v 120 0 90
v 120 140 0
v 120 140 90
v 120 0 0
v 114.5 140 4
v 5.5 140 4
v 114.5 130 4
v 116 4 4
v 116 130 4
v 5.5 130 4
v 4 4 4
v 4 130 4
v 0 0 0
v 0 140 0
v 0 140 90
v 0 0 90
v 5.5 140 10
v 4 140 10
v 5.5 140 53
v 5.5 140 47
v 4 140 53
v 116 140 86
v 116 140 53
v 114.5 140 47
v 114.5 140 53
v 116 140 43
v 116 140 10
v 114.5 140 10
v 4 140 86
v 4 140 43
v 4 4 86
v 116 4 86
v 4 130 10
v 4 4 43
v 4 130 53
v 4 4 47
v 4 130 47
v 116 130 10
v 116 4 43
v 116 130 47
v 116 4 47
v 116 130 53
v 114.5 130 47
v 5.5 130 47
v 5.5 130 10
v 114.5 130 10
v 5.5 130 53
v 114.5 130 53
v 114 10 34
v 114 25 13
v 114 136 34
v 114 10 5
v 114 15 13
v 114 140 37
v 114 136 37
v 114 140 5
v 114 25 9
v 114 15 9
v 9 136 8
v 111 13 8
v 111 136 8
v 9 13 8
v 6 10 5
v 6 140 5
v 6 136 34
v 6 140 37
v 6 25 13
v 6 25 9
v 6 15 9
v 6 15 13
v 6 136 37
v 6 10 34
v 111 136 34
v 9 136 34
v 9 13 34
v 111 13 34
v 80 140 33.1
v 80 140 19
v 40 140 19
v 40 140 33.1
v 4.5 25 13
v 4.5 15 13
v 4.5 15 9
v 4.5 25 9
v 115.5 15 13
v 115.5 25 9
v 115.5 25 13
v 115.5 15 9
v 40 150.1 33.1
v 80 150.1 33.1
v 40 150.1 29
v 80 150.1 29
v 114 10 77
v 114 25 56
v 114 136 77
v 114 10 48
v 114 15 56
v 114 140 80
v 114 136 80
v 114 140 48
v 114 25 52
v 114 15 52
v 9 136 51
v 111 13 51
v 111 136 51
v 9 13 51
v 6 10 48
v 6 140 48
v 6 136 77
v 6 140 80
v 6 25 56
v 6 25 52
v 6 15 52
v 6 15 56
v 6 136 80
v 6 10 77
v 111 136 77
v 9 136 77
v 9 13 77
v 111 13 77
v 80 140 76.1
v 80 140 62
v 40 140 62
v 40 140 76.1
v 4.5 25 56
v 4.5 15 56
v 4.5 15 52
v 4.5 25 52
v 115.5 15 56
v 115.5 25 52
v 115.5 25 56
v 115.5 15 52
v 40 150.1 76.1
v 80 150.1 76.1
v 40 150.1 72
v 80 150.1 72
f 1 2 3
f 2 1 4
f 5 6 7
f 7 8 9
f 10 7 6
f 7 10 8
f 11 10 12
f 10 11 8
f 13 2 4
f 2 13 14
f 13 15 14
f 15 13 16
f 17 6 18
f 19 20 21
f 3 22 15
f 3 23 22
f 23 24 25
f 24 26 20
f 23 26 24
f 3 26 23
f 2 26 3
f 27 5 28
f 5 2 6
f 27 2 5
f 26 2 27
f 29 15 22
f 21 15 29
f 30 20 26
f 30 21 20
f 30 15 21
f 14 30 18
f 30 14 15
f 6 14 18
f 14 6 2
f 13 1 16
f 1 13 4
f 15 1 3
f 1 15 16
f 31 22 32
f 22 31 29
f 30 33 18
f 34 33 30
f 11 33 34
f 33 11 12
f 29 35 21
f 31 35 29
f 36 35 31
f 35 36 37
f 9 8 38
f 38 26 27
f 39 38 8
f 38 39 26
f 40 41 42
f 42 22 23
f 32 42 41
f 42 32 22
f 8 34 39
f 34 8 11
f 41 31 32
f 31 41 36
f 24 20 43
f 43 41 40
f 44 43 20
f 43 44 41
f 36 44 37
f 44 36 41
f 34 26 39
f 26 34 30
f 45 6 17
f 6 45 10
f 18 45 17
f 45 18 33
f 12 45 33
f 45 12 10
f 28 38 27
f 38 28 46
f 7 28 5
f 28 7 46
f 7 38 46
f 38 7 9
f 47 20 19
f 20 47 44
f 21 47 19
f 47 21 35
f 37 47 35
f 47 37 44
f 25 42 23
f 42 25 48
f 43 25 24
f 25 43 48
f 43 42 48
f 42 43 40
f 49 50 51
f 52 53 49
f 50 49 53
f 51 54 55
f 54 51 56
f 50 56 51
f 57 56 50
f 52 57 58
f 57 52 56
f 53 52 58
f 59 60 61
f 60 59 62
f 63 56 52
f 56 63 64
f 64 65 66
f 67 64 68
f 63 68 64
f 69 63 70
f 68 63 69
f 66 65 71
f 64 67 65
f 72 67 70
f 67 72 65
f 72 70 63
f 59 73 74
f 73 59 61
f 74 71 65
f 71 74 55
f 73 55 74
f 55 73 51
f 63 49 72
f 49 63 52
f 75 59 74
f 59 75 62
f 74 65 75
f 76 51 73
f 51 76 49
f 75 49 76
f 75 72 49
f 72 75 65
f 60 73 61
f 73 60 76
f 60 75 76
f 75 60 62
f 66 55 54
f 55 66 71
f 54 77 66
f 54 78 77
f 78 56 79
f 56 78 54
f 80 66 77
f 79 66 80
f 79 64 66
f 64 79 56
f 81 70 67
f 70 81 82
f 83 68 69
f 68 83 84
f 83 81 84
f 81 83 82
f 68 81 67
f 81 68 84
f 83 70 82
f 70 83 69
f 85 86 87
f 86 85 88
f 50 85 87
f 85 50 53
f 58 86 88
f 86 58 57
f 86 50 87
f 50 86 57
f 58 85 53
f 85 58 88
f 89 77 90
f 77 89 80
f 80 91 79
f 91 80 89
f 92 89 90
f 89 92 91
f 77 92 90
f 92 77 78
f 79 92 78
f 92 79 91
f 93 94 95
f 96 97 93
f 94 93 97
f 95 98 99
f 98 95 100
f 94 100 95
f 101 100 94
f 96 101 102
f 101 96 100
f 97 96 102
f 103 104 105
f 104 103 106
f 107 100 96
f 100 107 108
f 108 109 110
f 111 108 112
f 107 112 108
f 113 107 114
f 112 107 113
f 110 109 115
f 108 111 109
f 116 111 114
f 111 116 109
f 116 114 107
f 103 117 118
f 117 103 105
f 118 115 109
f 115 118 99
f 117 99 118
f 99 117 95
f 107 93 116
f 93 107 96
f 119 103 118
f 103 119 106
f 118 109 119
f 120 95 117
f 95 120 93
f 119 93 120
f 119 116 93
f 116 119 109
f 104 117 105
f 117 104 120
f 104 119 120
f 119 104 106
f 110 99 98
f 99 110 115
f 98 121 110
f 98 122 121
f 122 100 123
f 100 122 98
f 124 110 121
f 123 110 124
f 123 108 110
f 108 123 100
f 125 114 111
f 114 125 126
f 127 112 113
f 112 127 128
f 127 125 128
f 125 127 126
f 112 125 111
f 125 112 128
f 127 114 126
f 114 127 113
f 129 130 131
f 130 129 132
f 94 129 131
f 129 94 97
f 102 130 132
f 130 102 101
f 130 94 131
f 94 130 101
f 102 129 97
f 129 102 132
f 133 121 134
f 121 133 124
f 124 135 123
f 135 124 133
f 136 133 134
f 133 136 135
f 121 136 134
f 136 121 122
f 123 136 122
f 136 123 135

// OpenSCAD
cadverify_only = "";
module instance(name, part, unit = 1) {
    echo(cadverify_instance = [name, part, unit]);
    if (cadverify_only == "" || cadverify_only == name) children();
}

part = "assembly"; // [assembly, frame, drawer]

// ---------- parameters (mm) ----------
W = 120; Df = 140; H = 90; t = 4;
DW = 108; DDbox = 126; frontT = 4; pullP = 10; DH = 32;

// frame assembly geometry (assembly coords: x 0..120, y 0..140 back->front, z 0..90)
module frame_asm() {
    union() {
        // bottom
        cube([120, 140, 4]);
        // top
        translate([0, 0, 86]) cube([120, 140, 4]);
        // left wall
        cube([4, 140, 90]);
        // right wall
        translate([116, 0, 0]) cube([4, 140, 90]);
        // back wall
        cube([120, 4, 90]);
        // middle shelf (between side walls, from back to front)
        translate([4, 0, 43]) cube([112, 140, 4]);
        // stop blocks: overlap into walls/floors by 0.1 for manifold union
        // lower left
        translate([3.9, 130, 3.9]) cube([1.6, 10, 6.1]);
        // lower right
        translate([114.5, 130, 3.9]) cube([1.6, 10, 6.1]);
        // upper left (on middle shelf)
        translate([3.9, 130, 46.9]) cube([1.6, 10, 6.1]);
        // upper right
        translate([114.5, 130, 46.9]) cube([1.6, 10, 6.1]);
    }
}

// drawer local geometry (local coords: box min at 0,0,0; x 0..108, y 0..130 box+front, pull to 140, z 0..32, tabs to x -1.5..109.5)
module drawer_local() {
    union() {
        // bottom
        cube([108, 126, 3]);
        // left wall
        translate([0, 0, 3]) cube([3, 126, 26]);
        // right wall
        translate([105, 0, 3]) cube([3, 126, 26]);
        // back wall
        translate([0, 0, 3]) cube([108, 3, 26]);
        // front panel (full height)
        translate([0, 126, 0]) cube([108, 4, 32]);
        // stop tabs (overlap 0.5 into side walls)
        translate([-1.5, 5, 4]) cube([2.0, 10, 4]);
        translate([107.5, 5, 4]) cube([2.0, 10, 4]);
        // pull wedge: convex hull of 4 bars along X at YZ corners
        hull() {
            translate([34, 129.9, 14]) cube([40, 0.1, 0.1]);
            translate([34, 129.9, 28]) cube([40, 0.1, 0.1]);
            translate([34, 140, 24]) cube([40, 0.1, 0.1]);
            translate([34, 140, 28]) cube([40, 0.1, 0.1]);
        }
    }
}

module frame_print() {
    translate([0, 90, 0]) rotate([90, 0, 0]) frame_asm();
}
module drawer_print() {
    drawer_local();
}

if (part == "frame") {
    echo(cadverify_spec = [
        ["bounds", [[0, 0, 0], [120, 90, 140]]],
        ["bodies", 1],
        ["through_holes", 0],
        ["support_faces", [["bed", "-z", 5000]]],
        ["overhangs_allowed", [
            ["lower_left_block", [[3.5, 79, 129], [6, 87, 141]]],
            ["lower_right_block", [[114, 79, 129], [117, 87, 141]]],
            ["upper_left_block", [[3.5, 36, 129], [6, 44, 141]]],
            ["upper_right_block", [[114, 36, 129], [117, 44, 141]]]
        ]],
        ["copies", 1],
        ["details", [
            ["side_wall", "thickness", [-1, 65, 70], [1, 0, 0], 4],
            ["back_plate", "thickness", [60, 65, -1], [0, 0, 1], 4],
            ["block_ll", "material", [[4, 80, 130], [5.5, 86, 140]], 0.9],
            ["block_lr", "material", [[114.5, 80, 130], [116, 86, 140]], 0.9],
            ["block_ul", "material", [[4, 37, 130], [5.5, 43, 140]], 0.9],
            ["block_ur", "material", [[114.5, 37, 130], [116, 43, 140]], 0.9],
            ["cavity_lower", "void", [[6, 47, 4], [114, 86, 129]], 0.9],
            ["cavity_upper", "void", [[6, 4, 4], [114, 43, 129]], 0.9]
        ]]
    ]);
    frame_print();
} else if (part == "drawer") {
    echo(cadverify_spec = [
        ["bounds", [[-1.5, 0, 0], [109.5, 140, 32]]],
        ["bodies", 1],
        ["through_holes", 0],
        ["support_faces", [["bed", "-z", 5000]]],
        ["overhangs_allowed", [
            ["tab_left", [[-2, 4, 3], [1, 16, 9]]],
            ["tab_right", [[107, 4, 3], [111, 16, 9]]],
            ["pull_underside", [[33, 129, 13], [75, 141, 29]]]
        ]],
        ["copies", 2],
        ["details", [
            ["bottom", "thickness", [54, 60, -1], [0, 0, 1], 3],
            ["side_wall", "thickness", [-1, 60, 15], [1, 0, 0], 3],
            ["tab_left", "material", [[-1.5, 5, 4], [0.5, 15, 8]], 0.9],
            ["tab_right", "material", [[107.5, 5, 4], [109.5, 15, 8]], 0.9],
            ["interior", "void", [[4, 4, 4], [104, 125, 28]], 0.9],
            ["pull", "view", [[34, 129, 14], [74, 140, 28]]]
        ]]
    ]);
    drawer_print();
} else if (part == "assembly") {
    echo(cadverify_spec = [
        ["bounds", [[0, 0, 0], [120, 150, 90]]],
        ["support_faces", [["desk", "-z", 5000]]],
        ["allowed_interferences", []],
        ["motions", [
            ["lower_slide", ["drawer_lower"], "slide", [0, 1, 0], [0, 104]],
            ["upper_slide", ["drawer_upper"], "slide", [0, 1, 0], [0, 104]]
        ]],
        ["assembly_order", [
            [["frame"], [0, 0, 0]],
            [["drawer_lower"], [0, -1, -0.03]],
            [["drawer_upper"], [0, -1, -0.03]]
        ]]
    ]);
    instance("frame", "frame") frame_asm();
    instance("drawer_lower", "drawer", 1) translate([6, 10, 5]) drawer_local();
    instance("drawer_upper", "drawer", 1) translate([6, 10, 48]) drawer_local();
}
